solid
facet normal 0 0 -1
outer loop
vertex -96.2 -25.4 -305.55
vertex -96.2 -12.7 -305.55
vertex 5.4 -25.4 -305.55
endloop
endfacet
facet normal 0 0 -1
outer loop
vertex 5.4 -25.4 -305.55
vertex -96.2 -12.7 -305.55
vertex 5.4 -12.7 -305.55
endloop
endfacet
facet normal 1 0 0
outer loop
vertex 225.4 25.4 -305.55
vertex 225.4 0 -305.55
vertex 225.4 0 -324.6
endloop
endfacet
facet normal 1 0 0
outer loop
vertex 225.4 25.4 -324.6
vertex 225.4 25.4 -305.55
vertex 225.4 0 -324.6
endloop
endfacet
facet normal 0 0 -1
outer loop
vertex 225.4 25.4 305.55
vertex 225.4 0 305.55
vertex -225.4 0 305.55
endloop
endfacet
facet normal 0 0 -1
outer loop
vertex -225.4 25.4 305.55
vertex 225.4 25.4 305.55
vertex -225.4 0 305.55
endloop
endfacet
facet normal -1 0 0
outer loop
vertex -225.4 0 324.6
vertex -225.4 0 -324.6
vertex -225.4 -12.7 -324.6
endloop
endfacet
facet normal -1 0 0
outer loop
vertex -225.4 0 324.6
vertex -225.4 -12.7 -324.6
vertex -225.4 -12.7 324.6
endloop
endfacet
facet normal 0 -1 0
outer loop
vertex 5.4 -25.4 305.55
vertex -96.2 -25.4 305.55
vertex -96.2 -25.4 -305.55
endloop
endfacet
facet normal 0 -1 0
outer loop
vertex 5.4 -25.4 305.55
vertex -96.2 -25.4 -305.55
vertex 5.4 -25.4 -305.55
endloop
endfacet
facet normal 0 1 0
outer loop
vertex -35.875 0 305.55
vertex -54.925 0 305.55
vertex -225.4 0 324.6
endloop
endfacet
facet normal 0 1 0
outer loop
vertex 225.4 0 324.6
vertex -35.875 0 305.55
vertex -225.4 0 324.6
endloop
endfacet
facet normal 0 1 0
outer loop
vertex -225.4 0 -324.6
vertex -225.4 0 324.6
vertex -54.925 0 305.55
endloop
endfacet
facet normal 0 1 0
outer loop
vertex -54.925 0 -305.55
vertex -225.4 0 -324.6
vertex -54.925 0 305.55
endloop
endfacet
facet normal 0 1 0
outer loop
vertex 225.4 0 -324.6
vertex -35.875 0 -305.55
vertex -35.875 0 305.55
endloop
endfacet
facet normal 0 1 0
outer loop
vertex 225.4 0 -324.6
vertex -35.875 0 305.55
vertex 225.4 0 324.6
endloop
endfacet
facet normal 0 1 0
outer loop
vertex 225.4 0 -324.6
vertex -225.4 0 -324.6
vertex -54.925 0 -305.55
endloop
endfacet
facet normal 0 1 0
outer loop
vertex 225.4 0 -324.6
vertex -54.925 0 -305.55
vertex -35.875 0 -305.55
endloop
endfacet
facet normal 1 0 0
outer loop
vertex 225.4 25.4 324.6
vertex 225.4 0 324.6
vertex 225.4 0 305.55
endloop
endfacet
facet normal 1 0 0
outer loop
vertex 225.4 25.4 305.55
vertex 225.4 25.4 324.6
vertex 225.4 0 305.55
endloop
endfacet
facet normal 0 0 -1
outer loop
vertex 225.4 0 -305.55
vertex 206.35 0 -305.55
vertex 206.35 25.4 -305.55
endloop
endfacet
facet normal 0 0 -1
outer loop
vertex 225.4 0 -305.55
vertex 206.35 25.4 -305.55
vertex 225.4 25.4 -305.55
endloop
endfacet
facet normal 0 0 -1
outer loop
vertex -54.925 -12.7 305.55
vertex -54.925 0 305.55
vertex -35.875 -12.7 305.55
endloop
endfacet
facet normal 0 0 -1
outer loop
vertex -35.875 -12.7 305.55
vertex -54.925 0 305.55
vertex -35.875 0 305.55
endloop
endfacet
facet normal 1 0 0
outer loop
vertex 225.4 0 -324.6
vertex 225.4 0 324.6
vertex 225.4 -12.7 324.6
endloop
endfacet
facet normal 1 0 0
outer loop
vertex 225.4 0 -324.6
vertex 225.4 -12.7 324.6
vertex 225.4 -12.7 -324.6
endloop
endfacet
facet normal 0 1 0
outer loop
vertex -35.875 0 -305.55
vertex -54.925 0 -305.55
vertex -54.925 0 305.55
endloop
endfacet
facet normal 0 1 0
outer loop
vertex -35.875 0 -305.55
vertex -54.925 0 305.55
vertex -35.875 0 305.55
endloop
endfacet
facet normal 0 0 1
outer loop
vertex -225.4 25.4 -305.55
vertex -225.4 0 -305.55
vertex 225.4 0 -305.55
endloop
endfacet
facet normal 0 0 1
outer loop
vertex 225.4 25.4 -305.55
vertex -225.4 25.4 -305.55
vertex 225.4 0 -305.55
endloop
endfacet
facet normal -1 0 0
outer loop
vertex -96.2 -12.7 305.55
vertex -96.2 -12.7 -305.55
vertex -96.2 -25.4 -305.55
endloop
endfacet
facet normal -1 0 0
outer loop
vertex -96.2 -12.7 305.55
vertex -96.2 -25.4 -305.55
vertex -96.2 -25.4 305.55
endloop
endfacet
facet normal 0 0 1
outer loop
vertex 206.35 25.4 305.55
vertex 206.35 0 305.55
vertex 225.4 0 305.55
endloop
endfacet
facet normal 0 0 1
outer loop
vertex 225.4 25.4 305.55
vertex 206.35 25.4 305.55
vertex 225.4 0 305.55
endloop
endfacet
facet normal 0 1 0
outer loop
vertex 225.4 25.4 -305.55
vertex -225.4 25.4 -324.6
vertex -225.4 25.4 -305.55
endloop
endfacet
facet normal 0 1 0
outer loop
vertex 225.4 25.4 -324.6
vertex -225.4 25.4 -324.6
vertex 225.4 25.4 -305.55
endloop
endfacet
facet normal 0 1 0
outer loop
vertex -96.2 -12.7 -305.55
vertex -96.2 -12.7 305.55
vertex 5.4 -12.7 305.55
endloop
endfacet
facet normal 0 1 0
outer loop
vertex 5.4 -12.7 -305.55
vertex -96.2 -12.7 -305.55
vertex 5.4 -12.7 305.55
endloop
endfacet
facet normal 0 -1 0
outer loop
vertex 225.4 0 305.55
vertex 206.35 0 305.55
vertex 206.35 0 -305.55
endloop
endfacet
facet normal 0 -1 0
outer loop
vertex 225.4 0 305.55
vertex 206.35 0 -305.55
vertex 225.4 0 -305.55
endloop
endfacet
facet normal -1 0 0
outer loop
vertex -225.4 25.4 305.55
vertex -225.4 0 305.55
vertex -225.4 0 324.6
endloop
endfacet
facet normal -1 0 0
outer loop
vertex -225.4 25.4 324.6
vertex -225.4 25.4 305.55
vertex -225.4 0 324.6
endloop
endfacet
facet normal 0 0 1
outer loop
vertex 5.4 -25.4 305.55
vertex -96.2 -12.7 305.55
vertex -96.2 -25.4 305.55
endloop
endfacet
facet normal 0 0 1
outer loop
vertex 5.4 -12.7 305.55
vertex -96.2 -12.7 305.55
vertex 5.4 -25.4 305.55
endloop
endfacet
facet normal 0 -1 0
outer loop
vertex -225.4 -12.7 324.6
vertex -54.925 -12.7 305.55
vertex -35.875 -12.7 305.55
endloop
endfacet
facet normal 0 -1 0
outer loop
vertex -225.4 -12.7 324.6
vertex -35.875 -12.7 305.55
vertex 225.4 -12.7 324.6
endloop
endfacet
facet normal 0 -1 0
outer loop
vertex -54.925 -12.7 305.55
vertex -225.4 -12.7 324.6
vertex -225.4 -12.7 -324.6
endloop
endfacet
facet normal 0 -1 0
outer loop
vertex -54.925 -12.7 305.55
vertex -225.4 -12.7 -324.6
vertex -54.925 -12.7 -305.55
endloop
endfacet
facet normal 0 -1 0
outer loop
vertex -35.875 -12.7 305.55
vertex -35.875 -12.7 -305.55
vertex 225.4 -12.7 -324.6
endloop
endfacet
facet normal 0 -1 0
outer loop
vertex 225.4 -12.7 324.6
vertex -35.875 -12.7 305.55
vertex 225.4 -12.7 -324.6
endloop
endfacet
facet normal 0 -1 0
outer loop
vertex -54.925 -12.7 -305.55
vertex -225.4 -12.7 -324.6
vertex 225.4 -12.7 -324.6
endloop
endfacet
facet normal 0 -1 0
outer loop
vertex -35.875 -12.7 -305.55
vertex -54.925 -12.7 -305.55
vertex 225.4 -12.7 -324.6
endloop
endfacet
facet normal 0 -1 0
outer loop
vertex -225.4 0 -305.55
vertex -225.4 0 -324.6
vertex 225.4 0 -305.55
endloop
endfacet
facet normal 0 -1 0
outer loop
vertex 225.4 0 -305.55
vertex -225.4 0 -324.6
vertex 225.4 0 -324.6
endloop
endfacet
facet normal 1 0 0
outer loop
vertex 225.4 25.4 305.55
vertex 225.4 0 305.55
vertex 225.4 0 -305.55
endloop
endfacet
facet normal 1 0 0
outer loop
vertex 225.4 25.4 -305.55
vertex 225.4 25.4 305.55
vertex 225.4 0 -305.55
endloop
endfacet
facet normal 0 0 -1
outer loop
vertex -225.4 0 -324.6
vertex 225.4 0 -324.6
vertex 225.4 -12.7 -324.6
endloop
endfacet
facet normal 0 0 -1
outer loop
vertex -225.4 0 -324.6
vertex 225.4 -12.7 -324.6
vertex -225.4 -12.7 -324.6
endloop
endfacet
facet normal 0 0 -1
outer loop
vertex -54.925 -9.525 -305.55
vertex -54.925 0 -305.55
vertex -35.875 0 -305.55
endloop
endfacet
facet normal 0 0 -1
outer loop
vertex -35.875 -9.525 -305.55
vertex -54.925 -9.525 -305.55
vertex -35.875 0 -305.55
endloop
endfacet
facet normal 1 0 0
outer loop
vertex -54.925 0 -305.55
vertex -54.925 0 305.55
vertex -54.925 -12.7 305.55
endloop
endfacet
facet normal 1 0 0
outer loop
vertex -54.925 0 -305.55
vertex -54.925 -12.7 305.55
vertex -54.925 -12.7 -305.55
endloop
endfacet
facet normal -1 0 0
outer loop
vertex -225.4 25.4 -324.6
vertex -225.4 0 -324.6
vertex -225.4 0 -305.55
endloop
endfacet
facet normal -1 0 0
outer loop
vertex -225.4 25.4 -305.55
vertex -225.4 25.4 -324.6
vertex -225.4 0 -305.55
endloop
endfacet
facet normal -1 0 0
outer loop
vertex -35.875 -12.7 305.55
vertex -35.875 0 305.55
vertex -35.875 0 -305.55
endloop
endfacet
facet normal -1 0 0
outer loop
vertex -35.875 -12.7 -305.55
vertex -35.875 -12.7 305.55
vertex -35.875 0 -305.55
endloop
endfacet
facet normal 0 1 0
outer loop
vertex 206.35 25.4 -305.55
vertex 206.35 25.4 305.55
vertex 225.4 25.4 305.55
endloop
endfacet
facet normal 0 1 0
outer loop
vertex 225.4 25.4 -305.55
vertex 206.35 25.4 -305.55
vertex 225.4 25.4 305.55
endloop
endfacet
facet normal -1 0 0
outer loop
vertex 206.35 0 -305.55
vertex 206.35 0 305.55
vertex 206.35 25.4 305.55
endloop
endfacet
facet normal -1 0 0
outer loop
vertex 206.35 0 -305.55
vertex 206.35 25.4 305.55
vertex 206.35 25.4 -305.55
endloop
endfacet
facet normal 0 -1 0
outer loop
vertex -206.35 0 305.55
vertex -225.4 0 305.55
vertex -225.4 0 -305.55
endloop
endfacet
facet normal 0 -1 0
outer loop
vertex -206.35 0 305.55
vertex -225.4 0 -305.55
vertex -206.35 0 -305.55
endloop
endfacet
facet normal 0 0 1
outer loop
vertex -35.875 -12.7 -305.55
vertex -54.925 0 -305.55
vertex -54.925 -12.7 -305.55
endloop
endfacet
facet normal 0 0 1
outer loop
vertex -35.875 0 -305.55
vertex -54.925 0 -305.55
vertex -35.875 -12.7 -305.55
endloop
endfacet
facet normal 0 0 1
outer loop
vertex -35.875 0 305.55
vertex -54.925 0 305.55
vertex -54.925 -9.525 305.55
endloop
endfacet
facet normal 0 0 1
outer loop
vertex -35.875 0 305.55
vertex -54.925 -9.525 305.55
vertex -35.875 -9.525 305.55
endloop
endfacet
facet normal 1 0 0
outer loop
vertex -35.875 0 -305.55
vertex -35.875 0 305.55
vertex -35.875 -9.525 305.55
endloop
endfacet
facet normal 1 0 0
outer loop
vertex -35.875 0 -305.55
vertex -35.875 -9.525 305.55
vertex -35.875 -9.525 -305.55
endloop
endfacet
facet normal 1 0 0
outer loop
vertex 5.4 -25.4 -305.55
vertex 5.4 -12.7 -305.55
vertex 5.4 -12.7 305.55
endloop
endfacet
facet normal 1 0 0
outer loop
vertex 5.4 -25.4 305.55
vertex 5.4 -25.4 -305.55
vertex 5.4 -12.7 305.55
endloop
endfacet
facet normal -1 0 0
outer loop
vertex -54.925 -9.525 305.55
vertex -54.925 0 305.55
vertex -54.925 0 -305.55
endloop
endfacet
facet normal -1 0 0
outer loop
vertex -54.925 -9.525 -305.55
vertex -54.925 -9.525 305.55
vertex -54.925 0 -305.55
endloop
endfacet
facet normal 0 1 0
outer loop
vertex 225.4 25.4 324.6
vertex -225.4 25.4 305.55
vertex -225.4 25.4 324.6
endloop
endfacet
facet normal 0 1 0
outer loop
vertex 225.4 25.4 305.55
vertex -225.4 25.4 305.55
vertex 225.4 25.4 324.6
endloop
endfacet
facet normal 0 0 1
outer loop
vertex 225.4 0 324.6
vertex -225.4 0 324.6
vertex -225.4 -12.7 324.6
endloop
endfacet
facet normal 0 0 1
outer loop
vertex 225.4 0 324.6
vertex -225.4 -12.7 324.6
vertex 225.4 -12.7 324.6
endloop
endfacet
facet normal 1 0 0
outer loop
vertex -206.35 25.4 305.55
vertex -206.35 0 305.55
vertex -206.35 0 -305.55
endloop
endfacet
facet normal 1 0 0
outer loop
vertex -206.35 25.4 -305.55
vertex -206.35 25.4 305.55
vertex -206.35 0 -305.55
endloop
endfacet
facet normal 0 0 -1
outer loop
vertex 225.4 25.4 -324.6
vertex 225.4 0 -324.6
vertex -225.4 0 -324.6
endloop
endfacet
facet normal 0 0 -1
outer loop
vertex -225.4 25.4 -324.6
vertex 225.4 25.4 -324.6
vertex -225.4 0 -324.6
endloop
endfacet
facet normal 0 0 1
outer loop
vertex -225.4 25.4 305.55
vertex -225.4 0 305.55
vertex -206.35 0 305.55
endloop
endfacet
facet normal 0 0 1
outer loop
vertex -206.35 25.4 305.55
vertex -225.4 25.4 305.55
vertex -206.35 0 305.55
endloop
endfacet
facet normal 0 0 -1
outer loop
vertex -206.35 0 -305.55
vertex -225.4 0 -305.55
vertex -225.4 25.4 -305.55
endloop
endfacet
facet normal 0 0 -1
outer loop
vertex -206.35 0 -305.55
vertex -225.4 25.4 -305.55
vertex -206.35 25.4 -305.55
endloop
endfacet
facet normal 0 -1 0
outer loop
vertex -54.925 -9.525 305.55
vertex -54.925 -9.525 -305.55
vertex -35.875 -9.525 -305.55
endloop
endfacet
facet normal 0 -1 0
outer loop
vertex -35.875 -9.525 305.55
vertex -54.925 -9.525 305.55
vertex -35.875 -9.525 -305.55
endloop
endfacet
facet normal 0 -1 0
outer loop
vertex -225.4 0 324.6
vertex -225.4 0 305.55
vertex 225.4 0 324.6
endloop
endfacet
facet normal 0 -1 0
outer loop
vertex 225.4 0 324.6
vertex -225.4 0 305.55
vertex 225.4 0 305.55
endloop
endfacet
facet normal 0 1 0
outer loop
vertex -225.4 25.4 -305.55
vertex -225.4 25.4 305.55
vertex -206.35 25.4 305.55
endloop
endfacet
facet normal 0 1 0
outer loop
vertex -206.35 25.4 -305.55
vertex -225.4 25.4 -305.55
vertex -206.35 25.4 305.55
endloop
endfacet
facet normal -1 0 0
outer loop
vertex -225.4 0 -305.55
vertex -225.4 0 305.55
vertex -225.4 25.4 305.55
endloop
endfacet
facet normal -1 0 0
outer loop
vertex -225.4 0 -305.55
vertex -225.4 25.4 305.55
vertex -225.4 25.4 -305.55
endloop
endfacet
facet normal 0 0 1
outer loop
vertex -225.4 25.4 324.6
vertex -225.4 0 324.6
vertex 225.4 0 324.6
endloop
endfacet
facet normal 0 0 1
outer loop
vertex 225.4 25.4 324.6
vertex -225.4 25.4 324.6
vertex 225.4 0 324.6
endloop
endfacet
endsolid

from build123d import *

# Parameters (mm, degrees)
SKETCH1_W             = 450.8
SKETCH1_H             = 649.2
BOSS_EXTRUDE1_DEPTH   = 12.7
SKETCH1_3_W           = 19.05
SKETCH1_3_H           = 611.1
BOSS_EXTRUDE2_DEPTH   = 25.4
BOSS_EXTRUDE2_2_DEPTH = 25.4
SKETCH1_4_W           = 450.8
SKETCH1_4_H           = 19.05
BOSS_EXTRUDE3_DEPTH   = 25.4
BOSS_EXTRUDE3_2_DEPTH = 25.4
SKETCH4_W             = 101.6
SKETCH4_H             = 611.1
BOSS_EXTRUDE5_DEPTH   = 12.7
SKETCH2_W             = 19.05
SKETCH2_H             = 611.1
CUT_EXTRUDE1_DEPTH    = 12.7
SKETCH2_2_W           = 19.05
SKETCH2_2_H           = 611.1
BOSS_EXTRUDE4_DEPTH   = 9.525


with BuildPart() as part:
    # Sketch1 → Boss-Extrude1 (new body)
    with BuildSketch(Plane(origin=(0, 0, 0), x_dir=(1, 0, 0), z_dir=(0, 1, 0))):
        Rectangle(SKETCH1_W, SKETCH1_H)
    extrude(amount=-BOSS_EXTRUDE1_DEPTH)

    # Sketch2 → Cut-Extrude1 (cut)
    with BuildSketch(Plane(origin=(0, 0, 0), x_dir=(1, 0, 0), z_dir=(0, 1, 0))):
        with Locations((-45.4, 0)):
            Rectangle(SKETCH2_W, SKETCH2_H)
    extrude(amount=-CUT_EXTRUDE1_DEPTH, mode=Mode.SUBTRACT)


with BuildPart() as body_2:
    # Sketch1<3> → Boss-Extrude2 (new body)
    with BuildSketch(Plane(origin=(0, 0, 0), x_dir=(1, 0, 0), z_dir=(0, 1, 0))):
        with Locations((215.875, 0)):
            Rectangle(SKETCH1_3_W, SKETCH1_3_H)
    extrude(amount=BOSS_EXTRUDE2_DEPTH)


with BuildPart() as body_3:
    # Sketch1<3> → Boss-Extrude2 2 (new body)
    with BuildSketch(Plane(origin=(0, 0, 0), x_dir=(1, 0, 0), z_dir=(0, 1, 0))):
        with Locations((-215.875, 0)):
            Rectangle(SKETCH1_3_W, SKETCH1_3_H)
    extrude(amount=BOSS_EXTRUDE2_2_DEPTH)


with BuildPart() as body_4:
    # Sketch1<4> → Boss-Extrude3 (new body)
    with BuildSketch(Plane(origin=(0, 0, 0), x_dir=(1, 0, 0), z_dir=(0, 1, 0))):
        with Locations((0, 315.075)):
            Rectangle(SKETCH1_4_W, SKETCH1_4_H)
    extrude(amount=BOSS_EXTRUDE3_DEPTH)


with BuildPart() as body_5:
    # Sketch1<4> → Boss-Extrude3 2 (new body)
    with BuildSketch(Plane(origin=(0, 0, 0), x_dir=(1, 0, 0), z_dir=(0, 1, 0))):
        with Locations((0, -315.075)):
            Rectangle(SKETCH1_4_W, SKETCH1_4_H)
    extrude(amount=BOSS_EXTRUDE3_2_DEPTH)


with BuildPart() as body_6:
    # Sketch4 → Boss-Extrude5 (new body)
    with BuildSketch(Plane.XZ.offset(12.7)):
        with Locations((-45.4, 0)):
            Rectangle(SKETCH4_W, SKETCH4_H)
    extrude(amount=BOSS_EXTRUDE5_DEPTH)


with BuildPart() as body_7:
    # Sketch2<2> → Boss-Extrude4 (new body)
    with BuildSketch(Plane(origin=(0, 0, 0), x_dir=(1, 0, 0), z_dir=(0, 1, 0))):
        with Locations((-45.4, 0)):
            Rectangle(SKETCH2_2_W, SKETCH2_2_H)
    extrude(amount=-BOSS_EXTRUDE4_DEPTH)


solid = Compound([part.part, body_2.part, body_3.part, body_4.part, body_5.part, body_6.part, body_7.part])
